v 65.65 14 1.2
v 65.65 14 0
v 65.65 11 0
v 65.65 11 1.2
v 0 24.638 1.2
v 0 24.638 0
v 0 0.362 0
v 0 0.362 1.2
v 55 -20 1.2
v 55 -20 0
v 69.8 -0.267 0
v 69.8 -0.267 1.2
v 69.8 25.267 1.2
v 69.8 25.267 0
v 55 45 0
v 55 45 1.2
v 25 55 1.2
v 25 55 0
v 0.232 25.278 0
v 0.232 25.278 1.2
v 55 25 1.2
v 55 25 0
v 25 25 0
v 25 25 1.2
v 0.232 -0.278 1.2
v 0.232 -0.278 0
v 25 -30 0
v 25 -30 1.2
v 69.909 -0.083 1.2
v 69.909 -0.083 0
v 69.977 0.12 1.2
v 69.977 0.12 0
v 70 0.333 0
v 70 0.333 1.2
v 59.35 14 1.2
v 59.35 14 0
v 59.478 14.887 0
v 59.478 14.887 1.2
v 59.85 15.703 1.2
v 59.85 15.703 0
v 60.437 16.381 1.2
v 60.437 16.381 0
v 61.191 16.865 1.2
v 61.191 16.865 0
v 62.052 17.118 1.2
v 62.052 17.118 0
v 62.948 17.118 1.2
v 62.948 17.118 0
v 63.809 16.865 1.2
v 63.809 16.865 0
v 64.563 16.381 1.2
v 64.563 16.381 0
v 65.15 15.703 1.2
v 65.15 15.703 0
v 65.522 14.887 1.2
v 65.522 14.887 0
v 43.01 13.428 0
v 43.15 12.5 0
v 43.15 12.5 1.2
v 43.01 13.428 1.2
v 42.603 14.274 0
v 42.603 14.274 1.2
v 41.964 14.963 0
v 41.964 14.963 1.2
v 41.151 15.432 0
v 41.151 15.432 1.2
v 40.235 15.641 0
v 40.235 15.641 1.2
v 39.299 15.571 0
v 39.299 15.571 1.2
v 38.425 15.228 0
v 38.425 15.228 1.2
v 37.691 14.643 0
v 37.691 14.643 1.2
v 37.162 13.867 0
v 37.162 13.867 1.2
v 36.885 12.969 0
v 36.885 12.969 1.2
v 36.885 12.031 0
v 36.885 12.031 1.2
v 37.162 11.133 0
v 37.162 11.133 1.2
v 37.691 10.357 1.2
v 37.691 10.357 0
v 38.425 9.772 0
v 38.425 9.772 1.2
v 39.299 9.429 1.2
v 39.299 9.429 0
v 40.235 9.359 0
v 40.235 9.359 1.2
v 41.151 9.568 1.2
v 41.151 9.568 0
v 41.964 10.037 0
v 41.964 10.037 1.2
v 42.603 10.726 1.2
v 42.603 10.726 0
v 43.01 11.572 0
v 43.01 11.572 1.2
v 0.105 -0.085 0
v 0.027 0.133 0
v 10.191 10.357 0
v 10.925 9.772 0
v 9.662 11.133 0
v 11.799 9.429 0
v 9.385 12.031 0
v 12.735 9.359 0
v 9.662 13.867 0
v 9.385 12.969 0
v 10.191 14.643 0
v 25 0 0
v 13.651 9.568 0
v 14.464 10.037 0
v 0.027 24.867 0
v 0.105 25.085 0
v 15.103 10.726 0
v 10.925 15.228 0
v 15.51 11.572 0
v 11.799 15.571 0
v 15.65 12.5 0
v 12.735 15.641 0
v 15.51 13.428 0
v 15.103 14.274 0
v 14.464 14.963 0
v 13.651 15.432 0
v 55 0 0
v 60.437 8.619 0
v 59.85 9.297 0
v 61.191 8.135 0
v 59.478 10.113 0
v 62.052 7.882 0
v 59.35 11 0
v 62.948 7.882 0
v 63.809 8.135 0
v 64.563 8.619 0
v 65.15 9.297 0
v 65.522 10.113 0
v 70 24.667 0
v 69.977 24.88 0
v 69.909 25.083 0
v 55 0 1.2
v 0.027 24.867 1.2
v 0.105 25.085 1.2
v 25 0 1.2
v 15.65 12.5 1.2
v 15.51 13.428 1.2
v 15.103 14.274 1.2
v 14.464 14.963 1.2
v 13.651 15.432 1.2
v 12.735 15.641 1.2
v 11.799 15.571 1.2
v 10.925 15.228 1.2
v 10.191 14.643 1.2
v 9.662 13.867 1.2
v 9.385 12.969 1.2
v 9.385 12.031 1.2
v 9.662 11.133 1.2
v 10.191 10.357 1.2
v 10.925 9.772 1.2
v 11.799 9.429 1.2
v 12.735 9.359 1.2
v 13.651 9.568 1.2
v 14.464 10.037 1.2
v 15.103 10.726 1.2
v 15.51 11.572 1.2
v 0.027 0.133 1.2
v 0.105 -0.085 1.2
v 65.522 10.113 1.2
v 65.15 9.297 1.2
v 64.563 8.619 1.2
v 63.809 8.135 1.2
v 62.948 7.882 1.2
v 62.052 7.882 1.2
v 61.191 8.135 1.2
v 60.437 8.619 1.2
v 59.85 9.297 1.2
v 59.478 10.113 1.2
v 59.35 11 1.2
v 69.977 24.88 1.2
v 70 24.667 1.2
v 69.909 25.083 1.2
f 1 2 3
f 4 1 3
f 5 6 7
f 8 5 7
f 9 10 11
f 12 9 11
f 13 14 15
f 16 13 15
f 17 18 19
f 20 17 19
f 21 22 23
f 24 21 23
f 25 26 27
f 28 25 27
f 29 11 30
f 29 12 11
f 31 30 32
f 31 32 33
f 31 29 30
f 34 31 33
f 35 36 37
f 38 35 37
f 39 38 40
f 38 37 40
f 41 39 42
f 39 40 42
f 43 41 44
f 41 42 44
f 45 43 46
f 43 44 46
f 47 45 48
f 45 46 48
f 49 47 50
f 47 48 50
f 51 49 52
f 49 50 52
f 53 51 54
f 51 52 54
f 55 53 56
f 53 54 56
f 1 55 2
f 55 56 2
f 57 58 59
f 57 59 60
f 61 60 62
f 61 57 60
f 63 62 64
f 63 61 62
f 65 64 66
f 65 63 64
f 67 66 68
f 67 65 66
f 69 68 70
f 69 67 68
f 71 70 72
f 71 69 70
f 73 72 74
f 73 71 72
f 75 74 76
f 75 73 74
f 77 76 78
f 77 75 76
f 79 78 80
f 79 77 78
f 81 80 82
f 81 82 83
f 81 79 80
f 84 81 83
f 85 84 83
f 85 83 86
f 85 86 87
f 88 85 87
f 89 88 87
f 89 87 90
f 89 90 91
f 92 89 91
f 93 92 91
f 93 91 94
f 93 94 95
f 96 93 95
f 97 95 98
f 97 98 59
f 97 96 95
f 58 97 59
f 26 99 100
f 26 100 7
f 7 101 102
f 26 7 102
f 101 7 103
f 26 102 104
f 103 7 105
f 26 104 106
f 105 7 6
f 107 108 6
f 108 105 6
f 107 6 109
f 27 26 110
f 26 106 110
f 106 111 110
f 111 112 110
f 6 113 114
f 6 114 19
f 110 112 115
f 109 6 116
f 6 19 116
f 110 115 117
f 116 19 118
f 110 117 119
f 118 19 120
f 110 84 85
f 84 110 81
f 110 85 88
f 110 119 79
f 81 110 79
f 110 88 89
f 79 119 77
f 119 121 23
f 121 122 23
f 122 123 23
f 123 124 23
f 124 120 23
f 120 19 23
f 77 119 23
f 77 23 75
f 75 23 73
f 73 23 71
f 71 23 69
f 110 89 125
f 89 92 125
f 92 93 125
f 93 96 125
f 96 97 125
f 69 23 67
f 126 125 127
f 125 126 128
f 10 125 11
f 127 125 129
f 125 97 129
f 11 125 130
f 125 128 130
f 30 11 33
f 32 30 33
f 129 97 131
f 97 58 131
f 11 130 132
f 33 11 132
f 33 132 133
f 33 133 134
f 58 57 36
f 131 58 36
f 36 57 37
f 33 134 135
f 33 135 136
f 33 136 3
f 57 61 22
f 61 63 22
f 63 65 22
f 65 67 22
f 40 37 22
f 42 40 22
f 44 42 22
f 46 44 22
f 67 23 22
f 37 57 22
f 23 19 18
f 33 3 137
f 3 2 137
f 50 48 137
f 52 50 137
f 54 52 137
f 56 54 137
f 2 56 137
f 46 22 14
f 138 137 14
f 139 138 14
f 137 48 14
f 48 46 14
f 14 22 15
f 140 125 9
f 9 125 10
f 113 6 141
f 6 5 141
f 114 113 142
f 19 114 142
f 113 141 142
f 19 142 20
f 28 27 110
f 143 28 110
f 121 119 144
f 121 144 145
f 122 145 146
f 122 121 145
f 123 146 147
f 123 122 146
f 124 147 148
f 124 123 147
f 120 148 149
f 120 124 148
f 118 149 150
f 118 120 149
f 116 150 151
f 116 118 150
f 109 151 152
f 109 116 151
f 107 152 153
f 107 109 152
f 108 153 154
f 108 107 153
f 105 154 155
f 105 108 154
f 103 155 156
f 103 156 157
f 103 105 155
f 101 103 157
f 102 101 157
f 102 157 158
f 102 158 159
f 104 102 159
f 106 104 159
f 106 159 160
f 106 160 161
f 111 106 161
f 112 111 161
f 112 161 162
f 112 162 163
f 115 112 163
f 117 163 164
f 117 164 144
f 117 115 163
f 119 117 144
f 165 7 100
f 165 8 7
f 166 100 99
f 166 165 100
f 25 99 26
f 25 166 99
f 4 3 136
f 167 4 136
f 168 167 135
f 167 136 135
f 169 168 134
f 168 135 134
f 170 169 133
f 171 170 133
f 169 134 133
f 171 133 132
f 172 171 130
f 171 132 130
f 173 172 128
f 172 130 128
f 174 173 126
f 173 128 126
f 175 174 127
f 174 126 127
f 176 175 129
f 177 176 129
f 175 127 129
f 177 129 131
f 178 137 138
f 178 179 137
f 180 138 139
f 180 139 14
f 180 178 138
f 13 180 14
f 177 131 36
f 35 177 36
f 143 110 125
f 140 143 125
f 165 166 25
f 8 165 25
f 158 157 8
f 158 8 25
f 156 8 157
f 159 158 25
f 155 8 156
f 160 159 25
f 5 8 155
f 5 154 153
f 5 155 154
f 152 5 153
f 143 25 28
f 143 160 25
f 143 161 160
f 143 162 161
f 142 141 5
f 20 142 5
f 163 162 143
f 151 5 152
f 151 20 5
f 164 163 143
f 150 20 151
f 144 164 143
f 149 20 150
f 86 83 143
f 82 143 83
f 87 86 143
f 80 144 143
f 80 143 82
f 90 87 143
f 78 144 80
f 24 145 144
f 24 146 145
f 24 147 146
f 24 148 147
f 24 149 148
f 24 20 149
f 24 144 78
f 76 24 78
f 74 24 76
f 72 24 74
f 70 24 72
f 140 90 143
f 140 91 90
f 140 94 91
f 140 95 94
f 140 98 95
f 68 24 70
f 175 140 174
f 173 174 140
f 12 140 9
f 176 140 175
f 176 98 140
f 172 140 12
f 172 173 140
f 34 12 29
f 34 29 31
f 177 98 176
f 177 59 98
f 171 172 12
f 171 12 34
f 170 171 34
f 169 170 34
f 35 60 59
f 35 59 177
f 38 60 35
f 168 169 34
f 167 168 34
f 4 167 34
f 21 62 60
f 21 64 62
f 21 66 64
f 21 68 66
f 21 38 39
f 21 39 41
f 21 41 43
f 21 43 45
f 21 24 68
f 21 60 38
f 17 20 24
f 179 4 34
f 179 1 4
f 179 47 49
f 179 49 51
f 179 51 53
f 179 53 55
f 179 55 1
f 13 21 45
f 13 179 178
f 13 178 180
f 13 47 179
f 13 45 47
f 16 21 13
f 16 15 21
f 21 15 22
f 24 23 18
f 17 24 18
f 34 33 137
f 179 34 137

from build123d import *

# Parameters (mm, degrees)
F0_R     = 3.15
F1_DEPTH = 1.2
F2_R     = 1


with BuildPart() as f1:
    # F0 (on Top) → F1 (new body)
    with BuildSketch(Plane.XY):
        Polygon((0, 25), (0, 0), (25, 0), (55, 0), (70, 0), (70, 25), (55, 25), (25, 25), align=None)
        with Locations((12.5, 12.5)):
            Circle(F0_R, mode=Mode.SUBTRACT)
        with Locations((40, 12.5)):
            Circle(F0_R, mode=Mode.SUBTRACT)
        with BuildLine():
            ThreePointArc((65.65, 11), (62.5, 7.85), (59.35, 11))
            Line((59.35, 11), (59.35, 14))
            ThreePointArc((59.35, 14), (62.5, 17.15), (65.65, 14))
            Line((65.65, 14), (65.65, 11))
        make_face(mode=Mode.SUBTRACT)
        Polygon((25, 0), (0, 0), (25, -30), align=None)
        Polygon((25, 55), (0, 25), (25, 25), align=None)
        Polygon((70, 0), (55, 0), (55, -20), align=None)
        Polygon((55, 45), (55, 25), (70, 25), align=None)
    extrude(amount=F1_DEPTH)

    # F2
    f2_edges = [f1.edges().sort_by_distance(p)[0] for p in [
        (0, 25, 0.6),
        (0, 0, 0.6),
        (70, 0, 0.6),
        (70, 25, 0.6),
    ]]
    fillet(f2_edges, radius=F2_R)


solid = f1.part
